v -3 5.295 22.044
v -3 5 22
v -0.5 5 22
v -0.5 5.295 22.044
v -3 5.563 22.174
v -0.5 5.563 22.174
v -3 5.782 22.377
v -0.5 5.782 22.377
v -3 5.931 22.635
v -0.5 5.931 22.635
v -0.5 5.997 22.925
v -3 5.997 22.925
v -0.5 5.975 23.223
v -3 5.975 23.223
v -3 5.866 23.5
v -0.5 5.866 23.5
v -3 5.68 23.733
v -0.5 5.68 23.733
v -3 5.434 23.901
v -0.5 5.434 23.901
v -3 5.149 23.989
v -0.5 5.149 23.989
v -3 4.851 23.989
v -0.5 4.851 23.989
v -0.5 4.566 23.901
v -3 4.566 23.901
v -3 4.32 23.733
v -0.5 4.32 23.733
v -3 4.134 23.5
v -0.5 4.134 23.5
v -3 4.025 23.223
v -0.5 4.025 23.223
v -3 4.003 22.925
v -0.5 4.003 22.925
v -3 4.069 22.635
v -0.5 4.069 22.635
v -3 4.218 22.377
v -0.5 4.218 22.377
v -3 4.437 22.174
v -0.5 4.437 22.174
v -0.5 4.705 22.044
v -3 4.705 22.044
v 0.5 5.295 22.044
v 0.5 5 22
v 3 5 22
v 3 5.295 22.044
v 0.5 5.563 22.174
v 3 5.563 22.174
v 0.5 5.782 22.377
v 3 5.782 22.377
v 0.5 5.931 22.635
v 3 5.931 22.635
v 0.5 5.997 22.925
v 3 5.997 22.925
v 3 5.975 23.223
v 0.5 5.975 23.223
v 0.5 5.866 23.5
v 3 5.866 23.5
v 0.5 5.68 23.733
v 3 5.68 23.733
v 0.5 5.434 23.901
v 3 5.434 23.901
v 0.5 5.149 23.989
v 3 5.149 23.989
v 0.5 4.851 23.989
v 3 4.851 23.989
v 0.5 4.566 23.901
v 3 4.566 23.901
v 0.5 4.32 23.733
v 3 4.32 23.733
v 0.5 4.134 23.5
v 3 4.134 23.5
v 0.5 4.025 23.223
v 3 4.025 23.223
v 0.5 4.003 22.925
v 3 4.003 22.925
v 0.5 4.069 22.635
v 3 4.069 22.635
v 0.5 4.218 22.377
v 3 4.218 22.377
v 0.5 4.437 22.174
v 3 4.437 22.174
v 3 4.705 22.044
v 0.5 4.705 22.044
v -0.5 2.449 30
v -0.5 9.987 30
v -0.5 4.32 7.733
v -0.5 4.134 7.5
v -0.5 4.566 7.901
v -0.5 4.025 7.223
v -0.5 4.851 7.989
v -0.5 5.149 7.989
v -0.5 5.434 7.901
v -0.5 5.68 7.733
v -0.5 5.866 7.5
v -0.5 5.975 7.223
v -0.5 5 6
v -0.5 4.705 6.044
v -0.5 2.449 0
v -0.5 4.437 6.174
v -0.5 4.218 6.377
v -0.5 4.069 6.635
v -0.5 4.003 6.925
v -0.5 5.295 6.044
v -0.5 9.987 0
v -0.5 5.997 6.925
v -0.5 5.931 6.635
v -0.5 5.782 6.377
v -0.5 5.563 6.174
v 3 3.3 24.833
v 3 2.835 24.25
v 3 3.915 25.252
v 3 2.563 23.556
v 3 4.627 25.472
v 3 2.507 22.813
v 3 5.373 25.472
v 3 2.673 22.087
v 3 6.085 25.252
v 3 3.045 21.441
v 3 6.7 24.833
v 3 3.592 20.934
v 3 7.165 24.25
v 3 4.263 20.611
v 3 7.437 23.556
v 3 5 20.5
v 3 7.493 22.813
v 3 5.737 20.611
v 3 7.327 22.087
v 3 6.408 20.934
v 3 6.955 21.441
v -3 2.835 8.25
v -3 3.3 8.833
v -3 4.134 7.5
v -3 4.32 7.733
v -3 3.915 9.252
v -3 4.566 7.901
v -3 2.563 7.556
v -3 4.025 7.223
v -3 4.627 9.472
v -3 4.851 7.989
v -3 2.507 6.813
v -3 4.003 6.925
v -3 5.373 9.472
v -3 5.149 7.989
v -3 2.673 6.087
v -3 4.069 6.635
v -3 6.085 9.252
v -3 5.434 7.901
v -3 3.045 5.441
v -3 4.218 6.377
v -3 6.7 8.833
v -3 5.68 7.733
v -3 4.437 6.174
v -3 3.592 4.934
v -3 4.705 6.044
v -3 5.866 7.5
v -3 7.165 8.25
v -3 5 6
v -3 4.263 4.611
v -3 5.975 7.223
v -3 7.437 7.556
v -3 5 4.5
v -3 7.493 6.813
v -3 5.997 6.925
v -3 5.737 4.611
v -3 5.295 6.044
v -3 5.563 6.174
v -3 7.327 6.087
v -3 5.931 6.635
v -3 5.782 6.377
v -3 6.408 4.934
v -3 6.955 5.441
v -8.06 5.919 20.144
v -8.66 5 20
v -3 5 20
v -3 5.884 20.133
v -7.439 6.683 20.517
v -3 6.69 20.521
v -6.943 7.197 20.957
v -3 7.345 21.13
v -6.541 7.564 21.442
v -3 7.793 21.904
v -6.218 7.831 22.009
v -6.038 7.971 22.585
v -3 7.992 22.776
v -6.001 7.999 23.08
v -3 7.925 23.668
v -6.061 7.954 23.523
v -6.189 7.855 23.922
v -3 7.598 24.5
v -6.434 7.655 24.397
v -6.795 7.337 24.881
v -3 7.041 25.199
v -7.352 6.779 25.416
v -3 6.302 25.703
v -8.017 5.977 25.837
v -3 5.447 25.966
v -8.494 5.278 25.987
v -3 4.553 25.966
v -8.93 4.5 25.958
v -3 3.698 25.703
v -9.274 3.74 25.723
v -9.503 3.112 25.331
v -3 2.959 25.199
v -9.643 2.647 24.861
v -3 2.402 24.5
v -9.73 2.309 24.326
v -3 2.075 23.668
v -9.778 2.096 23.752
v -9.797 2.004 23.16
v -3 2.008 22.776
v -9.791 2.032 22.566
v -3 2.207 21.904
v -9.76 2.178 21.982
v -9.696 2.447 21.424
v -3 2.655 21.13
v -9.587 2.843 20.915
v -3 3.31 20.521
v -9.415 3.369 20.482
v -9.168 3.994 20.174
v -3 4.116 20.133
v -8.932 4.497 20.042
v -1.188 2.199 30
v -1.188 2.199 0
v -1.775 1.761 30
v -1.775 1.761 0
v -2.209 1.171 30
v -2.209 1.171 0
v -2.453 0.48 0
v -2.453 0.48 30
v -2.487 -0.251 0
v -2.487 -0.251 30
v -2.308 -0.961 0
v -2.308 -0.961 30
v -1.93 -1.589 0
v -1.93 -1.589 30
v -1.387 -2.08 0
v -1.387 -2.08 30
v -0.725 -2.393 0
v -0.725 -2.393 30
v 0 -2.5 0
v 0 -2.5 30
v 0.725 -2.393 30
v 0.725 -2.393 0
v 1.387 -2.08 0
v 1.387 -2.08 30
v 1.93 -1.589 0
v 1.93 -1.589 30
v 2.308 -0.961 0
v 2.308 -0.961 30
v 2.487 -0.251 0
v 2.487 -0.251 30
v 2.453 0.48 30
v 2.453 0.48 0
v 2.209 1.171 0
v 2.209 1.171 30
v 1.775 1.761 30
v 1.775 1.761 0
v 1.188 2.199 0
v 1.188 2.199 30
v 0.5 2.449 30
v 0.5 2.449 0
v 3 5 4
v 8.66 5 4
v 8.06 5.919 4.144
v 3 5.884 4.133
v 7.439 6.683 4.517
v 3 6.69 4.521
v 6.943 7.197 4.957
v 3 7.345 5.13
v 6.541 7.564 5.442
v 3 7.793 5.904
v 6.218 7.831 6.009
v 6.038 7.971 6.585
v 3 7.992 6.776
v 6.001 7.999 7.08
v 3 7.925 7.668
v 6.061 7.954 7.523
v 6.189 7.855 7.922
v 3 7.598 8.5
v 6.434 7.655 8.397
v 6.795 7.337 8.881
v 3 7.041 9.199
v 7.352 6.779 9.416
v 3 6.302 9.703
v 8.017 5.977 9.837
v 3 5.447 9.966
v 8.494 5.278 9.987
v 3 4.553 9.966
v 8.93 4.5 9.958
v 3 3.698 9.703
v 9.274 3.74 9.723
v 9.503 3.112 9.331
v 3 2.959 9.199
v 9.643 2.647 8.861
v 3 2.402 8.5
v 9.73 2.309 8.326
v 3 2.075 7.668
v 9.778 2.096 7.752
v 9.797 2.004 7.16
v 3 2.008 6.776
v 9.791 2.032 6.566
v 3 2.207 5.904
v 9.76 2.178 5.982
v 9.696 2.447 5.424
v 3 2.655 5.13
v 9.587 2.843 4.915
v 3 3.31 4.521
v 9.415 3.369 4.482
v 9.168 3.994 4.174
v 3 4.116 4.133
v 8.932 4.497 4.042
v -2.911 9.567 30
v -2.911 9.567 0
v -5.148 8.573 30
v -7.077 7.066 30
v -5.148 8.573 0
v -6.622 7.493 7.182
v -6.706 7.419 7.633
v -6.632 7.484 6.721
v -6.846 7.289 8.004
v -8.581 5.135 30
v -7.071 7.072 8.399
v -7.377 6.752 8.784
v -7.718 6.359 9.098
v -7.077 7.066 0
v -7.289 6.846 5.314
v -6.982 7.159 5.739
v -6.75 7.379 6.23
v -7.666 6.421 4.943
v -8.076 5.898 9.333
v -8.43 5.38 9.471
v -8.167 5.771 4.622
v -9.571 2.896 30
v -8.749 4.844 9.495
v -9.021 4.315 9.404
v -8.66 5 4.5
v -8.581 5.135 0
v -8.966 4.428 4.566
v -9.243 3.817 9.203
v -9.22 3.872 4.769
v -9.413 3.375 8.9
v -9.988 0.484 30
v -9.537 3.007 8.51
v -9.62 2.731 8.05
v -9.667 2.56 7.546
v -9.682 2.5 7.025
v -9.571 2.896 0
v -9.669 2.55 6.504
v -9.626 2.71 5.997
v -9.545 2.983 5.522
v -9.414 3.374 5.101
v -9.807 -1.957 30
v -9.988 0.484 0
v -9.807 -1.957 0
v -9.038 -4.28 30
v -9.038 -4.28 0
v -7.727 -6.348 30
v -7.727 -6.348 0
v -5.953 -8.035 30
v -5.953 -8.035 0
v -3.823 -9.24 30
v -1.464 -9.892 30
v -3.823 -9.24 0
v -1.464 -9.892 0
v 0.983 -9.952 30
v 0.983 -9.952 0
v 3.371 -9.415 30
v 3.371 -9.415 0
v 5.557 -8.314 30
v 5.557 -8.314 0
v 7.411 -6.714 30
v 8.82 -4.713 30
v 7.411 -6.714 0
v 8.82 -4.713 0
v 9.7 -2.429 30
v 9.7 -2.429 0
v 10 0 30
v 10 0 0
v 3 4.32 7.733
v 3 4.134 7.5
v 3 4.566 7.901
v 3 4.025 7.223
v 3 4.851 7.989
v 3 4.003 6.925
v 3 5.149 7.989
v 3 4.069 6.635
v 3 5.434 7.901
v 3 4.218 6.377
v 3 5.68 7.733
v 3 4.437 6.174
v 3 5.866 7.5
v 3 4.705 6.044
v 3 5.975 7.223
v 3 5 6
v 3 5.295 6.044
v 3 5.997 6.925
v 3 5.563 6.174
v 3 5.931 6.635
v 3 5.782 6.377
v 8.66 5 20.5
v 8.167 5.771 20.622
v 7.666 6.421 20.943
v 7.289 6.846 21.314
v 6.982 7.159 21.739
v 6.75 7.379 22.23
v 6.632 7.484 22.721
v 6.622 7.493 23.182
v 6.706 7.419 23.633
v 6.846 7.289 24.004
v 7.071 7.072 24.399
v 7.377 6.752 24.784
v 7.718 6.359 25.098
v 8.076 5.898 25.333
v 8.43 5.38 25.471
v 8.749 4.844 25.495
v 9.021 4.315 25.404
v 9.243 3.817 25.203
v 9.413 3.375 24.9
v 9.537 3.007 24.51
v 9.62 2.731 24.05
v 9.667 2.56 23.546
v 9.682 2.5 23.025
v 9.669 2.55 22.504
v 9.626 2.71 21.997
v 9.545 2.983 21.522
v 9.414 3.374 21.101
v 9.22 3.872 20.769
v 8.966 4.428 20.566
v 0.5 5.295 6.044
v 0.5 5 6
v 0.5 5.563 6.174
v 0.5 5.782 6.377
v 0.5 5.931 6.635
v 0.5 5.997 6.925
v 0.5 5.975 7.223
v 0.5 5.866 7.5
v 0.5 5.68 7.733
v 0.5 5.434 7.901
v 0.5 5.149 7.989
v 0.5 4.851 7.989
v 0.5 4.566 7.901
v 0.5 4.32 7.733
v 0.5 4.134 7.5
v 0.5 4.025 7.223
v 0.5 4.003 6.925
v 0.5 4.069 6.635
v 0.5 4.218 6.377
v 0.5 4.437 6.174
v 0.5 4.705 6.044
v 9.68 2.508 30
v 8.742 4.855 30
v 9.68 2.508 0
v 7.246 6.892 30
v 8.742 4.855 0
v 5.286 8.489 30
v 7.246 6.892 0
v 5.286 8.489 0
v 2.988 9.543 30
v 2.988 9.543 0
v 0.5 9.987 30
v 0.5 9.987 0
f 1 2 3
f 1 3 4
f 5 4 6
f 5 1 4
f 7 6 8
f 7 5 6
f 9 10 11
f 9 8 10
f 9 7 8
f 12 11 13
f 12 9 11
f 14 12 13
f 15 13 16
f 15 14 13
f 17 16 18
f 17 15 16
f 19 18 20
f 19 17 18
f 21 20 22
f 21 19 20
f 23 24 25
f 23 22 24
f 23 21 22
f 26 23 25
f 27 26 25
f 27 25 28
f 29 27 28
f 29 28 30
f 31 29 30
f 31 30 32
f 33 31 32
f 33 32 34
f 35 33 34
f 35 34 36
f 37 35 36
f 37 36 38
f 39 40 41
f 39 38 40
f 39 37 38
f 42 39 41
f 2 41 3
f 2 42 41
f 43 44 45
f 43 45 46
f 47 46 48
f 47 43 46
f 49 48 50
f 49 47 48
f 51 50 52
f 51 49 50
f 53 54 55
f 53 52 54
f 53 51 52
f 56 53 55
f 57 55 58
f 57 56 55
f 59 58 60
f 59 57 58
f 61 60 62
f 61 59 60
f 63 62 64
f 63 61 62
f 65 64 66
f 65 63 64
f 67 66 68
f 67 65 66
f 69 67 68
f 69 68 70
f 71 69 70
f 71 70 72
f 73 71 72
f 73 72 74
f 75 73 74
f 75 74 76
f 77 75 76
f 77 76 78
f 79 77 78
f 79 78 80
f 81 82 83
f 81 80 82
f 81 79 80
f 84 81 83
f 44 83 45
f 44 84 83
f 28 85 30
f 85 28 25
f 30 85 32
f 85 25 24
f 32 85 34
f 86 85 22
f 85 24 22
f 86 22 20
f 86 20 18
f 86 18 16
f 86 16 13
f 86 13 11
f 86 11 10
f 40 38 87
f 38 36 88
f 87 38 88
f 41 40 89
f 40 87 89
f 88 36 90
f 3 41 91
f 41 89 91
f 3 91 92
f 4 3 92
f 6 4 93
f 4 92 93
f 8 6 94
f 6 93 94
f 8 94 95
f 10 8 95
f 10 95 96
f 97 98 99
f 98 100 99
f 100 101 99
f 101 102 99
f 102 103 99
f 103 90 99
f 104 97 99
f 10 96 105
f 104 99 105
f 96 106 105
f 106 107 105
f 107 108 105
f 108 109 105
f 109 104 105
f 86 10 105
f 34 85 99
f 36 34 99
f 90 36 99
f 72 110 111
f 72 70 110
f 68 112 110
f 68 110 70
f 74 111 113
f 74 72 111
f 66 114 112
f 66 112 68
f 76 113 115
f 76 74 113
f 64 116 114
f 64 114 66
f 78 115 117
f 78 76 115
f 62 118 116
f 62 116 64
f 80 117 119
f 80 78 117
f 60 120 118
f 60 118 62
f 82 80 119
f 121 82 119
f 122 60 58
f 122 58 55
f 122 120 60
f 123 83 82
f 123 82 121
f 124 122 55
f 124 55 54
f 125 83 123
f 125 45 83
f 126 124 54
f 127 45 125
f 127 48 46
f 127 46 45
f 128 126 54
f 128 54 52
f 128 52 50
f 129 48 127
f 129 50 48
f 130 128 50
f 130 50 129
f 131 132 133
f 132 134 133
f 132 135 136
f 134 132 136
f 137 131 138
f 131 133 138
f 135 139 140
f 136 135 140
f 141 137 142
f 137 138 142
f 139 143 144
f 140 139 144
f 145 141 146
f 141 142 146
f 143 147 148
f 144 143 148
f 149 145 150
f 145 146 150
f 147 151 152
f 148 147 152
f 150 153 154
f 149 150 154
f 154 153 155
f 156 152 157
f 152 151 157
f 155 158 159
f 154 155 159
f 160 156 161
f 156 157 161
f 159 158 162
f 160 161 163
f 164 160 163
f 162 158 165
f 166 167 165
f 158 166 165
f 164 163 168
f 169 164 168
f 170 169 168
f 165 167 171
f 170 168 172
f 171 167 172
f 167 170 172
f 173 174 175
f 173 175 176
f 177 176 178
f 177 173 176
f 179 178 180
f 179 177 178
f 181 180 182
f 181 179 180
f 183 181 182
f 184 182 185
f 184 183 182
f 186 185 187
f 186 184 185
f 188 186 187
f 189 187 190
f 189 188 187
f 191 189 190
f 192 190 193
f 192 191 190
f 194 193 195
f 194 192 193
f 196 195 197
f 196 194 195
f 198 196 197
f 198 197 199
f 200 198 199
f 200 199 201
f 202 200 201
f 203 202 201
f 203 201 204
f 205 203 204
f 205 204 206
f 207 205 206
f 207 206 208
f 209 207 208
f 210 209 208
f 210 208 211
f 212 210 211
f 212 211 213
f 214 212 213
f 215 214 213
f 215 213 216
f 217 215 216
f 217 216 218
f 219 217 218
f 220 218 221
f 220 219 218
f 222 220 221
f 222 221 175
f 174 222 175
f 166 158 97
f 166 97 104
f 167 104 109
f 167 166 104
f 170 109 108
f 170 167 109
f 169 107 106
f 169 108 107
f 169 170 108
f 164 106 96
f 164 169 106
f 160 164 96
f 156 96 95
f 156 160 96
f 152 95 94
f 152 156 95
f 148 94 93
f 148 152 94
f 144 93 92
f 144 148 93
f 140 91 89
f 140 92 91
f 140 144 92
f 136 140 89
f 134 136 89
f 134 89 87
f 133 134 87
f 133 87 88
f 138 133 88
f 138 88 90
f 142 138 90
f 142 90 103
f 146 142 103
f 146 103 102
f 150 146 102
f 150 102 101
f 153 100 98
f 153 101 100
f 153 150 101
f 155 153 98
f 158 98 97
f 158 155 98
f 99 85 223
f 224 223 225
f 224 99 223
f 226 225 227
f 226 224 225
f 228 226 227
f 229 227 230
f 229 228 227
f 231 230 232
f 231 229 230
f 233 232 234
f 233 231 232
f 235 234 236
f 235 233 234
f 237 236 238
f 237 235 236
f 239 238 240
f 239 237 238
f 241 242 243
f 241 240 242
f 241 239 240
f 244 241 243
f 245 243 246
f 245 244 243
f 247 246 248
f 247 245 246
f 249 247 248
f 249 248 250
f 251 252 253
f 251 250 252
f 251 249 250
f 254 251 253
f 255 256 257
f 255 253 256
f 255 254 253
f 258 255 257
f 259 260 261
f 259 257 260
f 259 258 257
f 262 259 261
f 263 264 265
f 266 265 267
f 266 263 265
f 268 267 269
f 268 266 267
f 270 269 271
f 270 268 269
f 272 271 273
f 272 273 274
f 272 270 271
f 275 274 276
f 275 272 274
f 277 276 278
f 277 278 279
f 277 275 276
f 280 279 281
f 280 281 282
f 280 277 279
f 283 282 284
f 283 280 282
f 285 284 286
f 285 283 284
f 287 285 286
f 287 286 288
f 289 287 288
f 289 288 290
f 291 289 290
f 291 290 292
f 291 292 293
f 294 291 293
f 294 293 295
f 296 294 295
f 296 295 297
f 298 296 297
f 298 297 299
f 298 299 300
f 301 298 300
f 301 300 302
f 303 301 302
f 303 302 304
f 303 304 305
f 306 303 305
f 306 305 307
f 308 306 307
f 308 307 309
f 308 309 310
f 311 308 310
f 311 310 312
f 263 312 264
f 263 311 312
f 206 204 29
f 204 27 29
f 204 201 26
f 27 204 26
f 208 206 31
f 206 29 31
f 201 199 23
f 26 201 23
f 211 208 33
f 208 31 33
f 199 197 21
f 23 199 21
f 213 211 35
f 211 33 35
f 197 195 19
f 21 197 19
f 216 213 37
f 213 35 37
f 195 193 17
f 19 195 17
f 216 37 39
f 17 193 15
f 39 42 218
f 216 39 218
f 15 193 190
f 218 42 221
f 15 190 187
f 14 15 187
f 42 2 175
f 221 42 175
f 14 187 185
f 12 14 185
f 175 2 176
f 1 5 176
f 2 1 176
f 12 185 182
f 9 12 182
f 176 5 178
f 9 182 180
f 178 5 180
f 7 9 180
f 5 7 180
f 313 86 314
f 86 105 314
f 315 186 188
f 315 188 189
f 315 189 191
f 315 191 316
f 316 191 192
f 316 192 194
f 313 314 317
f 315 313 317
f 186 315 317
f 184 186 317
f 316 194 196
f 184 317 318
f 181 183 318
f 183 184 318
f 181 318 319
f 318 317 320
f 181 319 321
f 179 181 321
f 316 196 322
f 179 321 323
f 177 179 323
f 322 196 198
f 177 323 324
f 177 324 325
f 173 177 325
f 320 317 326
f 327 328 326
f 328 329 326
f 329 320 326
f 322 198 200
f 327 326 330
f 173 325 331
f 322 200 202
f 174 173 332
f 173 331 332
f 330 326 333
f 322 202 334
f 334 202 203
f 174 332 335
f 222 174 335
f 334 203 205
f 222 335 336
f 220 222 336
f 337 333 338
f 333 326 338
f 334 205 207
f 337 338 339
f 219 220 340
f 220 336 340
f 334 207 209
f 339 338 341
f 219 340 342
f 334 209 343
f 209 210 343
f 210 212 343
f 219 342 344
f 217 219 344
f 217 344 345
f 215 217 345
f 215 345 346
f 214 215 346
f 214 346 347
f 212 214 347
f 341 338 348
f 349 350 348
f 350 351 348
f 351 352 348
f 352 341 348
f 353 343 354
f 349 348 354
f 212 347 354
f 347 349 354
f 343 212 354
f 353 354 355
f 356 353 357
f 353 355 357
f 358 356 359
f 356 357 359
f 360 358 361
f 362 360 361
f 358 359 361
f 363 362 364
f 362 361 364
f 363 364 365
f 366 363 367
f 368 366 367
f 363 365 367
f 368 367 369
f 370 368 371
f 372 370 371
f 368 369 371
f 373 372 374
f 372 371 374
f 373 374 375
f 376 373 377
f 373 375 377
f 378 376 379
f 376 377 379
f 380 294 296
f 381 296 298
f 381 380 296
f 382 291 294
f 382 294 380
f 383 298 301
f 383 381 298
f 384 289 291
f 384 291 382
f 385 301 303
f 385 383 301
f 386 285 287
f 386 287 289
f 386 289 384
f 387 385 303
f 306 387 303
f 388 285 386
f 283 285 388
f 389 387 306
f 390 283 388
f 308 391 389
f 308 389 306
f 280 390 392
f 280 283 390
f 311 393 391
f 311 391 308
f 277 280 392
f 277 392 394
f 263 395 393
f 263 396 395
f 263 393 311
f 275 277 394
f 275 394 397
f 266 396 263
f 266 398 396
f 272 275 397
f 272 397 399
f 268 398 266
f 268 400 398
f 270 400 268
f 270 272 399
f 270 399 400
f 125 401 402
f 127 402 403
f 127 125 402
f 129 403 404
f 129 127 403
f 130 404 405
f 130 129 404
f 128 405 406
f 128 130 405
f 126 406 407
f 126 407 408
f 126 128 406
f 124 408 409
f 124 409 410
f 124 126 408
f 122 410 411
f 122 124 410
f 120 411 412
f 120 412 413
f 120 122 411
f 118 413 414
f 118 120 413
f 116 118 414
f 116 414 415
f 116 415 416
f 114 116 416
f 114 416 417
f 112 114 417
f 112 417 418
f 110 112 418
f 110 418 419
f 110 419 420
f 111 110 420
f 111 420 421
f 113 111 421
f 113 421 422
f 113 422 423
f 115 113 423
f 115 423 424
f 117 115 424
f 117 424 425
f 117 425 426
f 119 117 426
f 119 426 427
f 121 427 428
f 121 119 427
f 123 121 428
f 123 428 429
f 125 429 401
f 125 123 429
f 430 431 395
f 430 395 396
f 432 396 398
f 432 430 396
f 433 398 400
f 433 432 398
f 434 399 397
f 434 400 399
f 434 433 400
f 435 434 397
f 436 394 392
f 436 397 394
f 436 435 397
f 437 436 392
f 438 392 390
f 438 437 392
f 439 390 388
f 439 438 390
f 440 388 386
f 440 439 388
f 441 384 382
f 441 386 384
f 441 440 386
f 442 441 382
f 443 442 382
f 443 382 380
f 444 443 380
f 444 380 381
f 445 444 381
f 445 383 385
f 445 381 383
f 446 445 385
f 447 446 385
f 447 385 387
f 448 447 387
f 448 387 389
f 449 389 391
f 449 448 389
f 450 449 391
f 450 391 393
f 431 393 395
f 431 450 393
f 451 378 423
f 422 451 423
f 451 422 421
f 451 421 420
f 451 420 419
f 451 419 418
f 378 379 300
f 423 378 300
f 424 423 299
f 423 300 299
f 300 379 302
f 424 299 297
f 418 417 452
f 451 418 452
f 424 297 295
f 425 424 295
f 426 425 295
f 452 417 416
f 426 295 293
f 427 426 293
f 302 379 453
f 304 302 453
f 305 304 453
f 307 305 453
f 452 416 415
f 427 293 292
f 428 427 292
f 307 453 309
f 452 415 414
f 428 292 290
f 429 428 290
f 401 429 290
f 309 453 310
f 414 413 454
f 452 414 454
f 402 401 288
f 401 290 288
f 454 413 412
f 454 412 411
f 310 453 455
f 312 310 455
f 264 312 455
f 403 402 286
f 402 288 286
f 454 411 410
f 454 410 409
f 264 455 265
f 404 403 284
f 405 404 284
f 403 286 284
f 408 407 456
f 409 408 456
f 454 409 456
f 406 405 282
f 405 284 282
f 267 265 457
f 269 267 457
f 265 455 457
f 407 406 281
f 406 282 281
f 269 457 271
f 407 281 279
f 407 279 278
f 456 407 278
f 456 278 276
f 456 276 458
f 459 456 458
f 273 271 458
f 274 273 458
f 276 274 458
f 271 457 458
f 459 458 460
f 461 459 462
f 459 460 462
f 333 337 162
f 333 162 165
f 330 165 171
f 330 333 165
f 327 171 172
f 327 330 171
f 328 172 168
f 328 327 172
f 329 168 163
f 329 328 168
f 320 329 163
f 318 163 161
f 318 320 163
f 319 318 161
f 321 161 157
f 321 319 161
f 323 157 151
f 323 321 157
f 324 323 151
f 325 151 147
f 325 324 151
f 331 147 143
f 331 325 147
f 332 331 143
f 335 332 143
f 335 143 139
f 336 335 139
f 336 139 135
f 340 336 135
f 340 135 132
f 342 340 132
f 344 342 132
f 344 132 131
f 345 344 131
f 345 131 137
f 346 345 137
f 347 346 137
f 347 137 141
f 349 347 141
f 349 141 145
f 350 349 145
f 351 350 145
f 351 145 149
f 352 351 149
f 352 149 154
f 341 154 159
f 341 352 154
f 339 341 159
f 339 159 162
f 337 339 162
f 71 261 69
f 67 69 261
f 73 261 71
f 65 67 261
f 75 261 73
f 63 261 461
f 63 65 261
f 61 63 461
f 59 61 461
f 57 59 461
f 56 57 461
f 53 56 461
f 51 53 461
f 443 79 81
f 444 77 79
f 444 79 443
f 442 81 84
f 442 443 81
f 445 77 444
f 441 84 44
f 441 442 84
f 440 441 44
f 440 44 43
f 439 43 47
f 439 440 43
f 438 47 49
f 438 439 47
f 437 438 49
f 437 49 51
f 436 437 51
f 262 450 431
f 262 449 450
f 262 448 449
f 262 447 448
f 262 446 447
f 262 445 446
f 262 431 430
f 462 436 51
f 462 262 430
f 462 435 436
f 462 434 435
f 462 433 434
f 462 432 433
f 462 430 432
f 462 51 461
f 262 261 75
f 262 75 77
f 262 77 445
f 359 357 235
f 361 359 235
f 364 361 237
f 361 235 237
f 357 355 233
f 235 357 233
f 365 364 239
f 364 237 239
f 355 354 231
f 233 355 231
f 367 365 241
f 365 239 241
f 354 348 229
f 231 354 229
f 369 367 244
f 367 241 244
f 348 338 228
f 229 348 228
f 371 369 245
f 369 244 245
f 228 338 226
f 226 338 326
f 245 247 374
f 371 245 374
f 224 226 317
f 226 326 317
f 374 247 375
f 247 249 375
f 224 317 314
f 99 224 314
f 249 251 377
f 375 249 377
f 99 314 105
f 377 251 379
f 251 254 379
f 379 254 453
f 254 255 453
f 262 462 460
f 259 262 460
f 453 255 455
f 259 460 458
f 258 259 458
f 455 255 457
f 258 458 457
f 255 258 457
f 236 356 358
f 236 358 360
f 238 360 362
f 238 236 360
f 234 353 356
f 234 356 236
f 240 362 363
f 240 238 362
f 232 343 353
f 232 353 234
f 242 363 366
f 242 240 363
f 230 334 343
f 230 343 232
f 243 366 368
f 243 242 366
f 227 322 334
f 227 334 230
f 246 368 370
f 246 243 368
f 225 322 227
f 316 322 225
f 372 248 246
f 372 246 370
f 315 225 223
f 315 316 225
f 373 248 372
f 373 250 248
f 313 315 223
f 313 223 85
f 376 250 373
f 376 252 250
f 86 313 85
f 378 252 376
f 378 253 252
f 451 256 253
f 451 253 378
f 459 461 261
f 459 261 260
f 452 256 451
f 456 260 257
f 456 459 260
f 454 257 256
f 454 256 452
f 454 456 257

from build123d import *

# Parameters (mm, degrees)
BOX_W                         = 1
BOX_H                         = 11
BOX_DEPTH                     = 30
CYLINDER_R                    = 1
CYLINDER_DEPTH                = 20
CYLINDER_PITCH_ANGLE          = 90
CYLINDER003_R                 = 1
CYLINDER003_DEPTH             = 20
CYLINDER003_PITCH_ANGLE       = 90
CYLINDER004001_R              = 2.5
CYLINDER004001_DEPTH          = 7
CYLINDER004001_PITCH_ANGLE    = 90
CYLINDER004_R                 = 3
CYLINDER004_DEPTH             = 7
CYLINDER004_PITCH_ANGLE       = 90
CYLINDER004002_R              = 2.5
CYLINDER004002_DEPTH          = 7
CYLINDER004002_PITCH_ANGLE    = 90
CYLINDER004002001_R           = 3
CYLINDER004002001_DEPTH       = 7
CYLINDER004002001_PITCH_ANGLE = 90
CYLINDER001_R                 = 2.5
CYLINDER001_DEPTH             = 30
CYLINDER002_R                 = 10
CYLINDER002_DEPTH             = 30


with BuildPart() as fente_1mm:
    # Box → Box (new body)
    with BuildSketch(Plane(origin=(-0.5, 0, 0), x_dir=(1, 0, 0), z_dir=(0, 0, 1))):
        with Locations((0.5, 5.5)):
            Rectangle(BOX_W, BOX_H)
    extrude(amount=BOX_DEPTH)


with BuildPart() as trou_vis_haut:
    # Cylinder → Cylinder (new body)
    with BuildSketch(Plane.XY):
        Circle(CYLINDER_R)
    extrude(amount=CYLINDER_DEPTH)


with BuildPart() as trou_vis_haut_1:
    # Cylinder pitch: moved
    add(trou_vis_haut.part.rotate(Axis((0, 0, 0), (0, 1, 0)), CYLINDER_PITCH_ANGLE))


with BuildPart() as trou_vis_haut_2:
    # Cylinder placement: moved
    add(trou_vis_haut_1.part.moved(Location((-10, 5, 23))))


with BuildPart() as trou_vis_bas:
    # Cylinder003 → Cylinder003 (new body)
    with BuildSketch(Plane.XY):
        Circle(CYLINDER003_R)
    extrude(amount=CYLINDER003_DEPTH)


with BuildPart() as trou_vis_bas_1:
    # Cylinder003 pitch: moved
    add(trou_vis_bas.part.rotate(Axis((0, 0, 0), (0, 1, 0)), CYLINDER003_PITCH_ANGLE))


with BuildPart() as trou_vis_bas_2:
    # Cylinder003 placement: moved
    add(trou_vis_bas_1.part.moved(Location((-10, 5, 7))))


with BuildPart() as trou_tete_bg:
    # Cylinder004001 → Cylinder004001 (new body)
    with BuildSketch(Plane.XY):
        Circle(CYLINDER004001_R)
    extrude(amount=CYLINDER004001_DEPTH)


with BuildPart() as trou_tete_bg_1:
    # Cylinder004001 pitch: moved
    add(trou_tete_bg.part.rotate(Axis((0, 0, 0), (0, 1, 0)), CYLINDER004001_PITCH_ANGLE))


with BuildPart() as trou_tete_bg_2:
    # Cylinder004001 placement: moved
    add(trou_tete_bg_1.part.moved(Location((-10, 5, 7))))


with BuildPart() as trou_tete_bd:
    # Cylinder004 → Cylinder004 (new body)
    with BuildSketch(Plane.XY):
        Circle(CYLINDER004_R)
    extrude(amount=CYLINDER004_DEPTH)


with BuildPart() as trou_tete_bd_1:
    # Cylinder004 pitch: moved
    add(trou_tete_bd.part.rotate(Axis((0, 0, 0), (0, 1, 0)), CYLINDER004_PITCH_ANGLE))


with BuildPart() as trou_tete_bd_2:
    # Cylinder004 placement: moved
    add(trou_tete_bd_1.part.moved(Location((2.999997, 5, 7.000003))))


with BuildPart() as trou_tete_hg:
    # Cylinder004002 → Cylinder004002 (new body)
    with BuildSketch(Plane.XY):
        Circle(CYLINDER004002_R)
    extrude(amount=CYLINDER004002_DEPTH)


with BuildPart() as trou_tete_hg_1:
    # Cylinder004002 pitch: moved
    add(trou_tete_hg.part.rotate(Axis((0, 0, 0), (0, 1, 0)), CYLINDER004002_PITCH_ANGLE))


with BuildPart() as trou_tete_hg_2:
    # Cylinder004002 placement: moved
    add(trou_tete_hg_1.part.moved(Location((3, 5, 23))))


with BuildPart() as trou_tete_hg001:
    # Cylinder004002001 → Cylinder004002001 (new body)
    with BuildSketch(Plane.XY):
        Circle(CYLINDER004002001_R)
    extrude(amount=CYLINDER004002001_DEPTH)


with BuildPart() as trou_tete_hg001_1:
    # Cylinder004002001 pitch: moved
    add(trou_tete_hg001.part.rotate(Axis((0, 0, 0), (0, 1, 0)), CYLINDER004002001_PITCH_ANGLE))


with BuildPart() as trou_tete_hg001_2:
    # Cylinder004002001 placement: moved
    add(trou_tete_hg001_1.part.moved(Location((-10, 5, 23))))


with BuildPart() as cylinder001:
    # Cylinder001 → Cylinder001 (new body)
    with BuildSketch(Plane.XY):
        Circle(CYLINDER001_R)
    extrude(amount=CYLINDER001_DEPTH)


with BuildPart() as cut007:
    # Cylinder002 → Cylinder002 (new body)
    with BuildSketch(Plane.XY):
        Circle(CYLINDER002_R)
    extrude(amount=CYLINDER002_DEPTH)

    # Cut: cut Cylinder001
    add(cylinder001.part, mode=Mode.SUBTRACT)

    # Cut001: cut Trou tete hg001
    add(trou_tete_hg001_2.part, mode=Mode.SUBTRACT)

    # Cut002: cut Trou tete hg
    add(trou_tete_hg_2.part, mode=Mode.SUBTRACT)

    # Cut003: cut Trou tete bd
    add(trou_tete_bd_2.part, mode=Mode.SUBTRACT)

    # Cut004: cut Trou tete bg
    add(trou_tete_bg_2.part, mode=Mode.SUBTRACT)

    # Cut005: cut trou vis bas
    add(trou_vis_bas_2.part, mode=Mode.SUBTRACT)

    # Cut006: cut  trou vis haut
    add(trou_vis_haut_2.part, mode=Mode.SUBTRACT)

    # Cut007: cut fente 1mm
    add(fente_1mm.part, mode=Mode.SUBTRACT)


solid = cut007.part
